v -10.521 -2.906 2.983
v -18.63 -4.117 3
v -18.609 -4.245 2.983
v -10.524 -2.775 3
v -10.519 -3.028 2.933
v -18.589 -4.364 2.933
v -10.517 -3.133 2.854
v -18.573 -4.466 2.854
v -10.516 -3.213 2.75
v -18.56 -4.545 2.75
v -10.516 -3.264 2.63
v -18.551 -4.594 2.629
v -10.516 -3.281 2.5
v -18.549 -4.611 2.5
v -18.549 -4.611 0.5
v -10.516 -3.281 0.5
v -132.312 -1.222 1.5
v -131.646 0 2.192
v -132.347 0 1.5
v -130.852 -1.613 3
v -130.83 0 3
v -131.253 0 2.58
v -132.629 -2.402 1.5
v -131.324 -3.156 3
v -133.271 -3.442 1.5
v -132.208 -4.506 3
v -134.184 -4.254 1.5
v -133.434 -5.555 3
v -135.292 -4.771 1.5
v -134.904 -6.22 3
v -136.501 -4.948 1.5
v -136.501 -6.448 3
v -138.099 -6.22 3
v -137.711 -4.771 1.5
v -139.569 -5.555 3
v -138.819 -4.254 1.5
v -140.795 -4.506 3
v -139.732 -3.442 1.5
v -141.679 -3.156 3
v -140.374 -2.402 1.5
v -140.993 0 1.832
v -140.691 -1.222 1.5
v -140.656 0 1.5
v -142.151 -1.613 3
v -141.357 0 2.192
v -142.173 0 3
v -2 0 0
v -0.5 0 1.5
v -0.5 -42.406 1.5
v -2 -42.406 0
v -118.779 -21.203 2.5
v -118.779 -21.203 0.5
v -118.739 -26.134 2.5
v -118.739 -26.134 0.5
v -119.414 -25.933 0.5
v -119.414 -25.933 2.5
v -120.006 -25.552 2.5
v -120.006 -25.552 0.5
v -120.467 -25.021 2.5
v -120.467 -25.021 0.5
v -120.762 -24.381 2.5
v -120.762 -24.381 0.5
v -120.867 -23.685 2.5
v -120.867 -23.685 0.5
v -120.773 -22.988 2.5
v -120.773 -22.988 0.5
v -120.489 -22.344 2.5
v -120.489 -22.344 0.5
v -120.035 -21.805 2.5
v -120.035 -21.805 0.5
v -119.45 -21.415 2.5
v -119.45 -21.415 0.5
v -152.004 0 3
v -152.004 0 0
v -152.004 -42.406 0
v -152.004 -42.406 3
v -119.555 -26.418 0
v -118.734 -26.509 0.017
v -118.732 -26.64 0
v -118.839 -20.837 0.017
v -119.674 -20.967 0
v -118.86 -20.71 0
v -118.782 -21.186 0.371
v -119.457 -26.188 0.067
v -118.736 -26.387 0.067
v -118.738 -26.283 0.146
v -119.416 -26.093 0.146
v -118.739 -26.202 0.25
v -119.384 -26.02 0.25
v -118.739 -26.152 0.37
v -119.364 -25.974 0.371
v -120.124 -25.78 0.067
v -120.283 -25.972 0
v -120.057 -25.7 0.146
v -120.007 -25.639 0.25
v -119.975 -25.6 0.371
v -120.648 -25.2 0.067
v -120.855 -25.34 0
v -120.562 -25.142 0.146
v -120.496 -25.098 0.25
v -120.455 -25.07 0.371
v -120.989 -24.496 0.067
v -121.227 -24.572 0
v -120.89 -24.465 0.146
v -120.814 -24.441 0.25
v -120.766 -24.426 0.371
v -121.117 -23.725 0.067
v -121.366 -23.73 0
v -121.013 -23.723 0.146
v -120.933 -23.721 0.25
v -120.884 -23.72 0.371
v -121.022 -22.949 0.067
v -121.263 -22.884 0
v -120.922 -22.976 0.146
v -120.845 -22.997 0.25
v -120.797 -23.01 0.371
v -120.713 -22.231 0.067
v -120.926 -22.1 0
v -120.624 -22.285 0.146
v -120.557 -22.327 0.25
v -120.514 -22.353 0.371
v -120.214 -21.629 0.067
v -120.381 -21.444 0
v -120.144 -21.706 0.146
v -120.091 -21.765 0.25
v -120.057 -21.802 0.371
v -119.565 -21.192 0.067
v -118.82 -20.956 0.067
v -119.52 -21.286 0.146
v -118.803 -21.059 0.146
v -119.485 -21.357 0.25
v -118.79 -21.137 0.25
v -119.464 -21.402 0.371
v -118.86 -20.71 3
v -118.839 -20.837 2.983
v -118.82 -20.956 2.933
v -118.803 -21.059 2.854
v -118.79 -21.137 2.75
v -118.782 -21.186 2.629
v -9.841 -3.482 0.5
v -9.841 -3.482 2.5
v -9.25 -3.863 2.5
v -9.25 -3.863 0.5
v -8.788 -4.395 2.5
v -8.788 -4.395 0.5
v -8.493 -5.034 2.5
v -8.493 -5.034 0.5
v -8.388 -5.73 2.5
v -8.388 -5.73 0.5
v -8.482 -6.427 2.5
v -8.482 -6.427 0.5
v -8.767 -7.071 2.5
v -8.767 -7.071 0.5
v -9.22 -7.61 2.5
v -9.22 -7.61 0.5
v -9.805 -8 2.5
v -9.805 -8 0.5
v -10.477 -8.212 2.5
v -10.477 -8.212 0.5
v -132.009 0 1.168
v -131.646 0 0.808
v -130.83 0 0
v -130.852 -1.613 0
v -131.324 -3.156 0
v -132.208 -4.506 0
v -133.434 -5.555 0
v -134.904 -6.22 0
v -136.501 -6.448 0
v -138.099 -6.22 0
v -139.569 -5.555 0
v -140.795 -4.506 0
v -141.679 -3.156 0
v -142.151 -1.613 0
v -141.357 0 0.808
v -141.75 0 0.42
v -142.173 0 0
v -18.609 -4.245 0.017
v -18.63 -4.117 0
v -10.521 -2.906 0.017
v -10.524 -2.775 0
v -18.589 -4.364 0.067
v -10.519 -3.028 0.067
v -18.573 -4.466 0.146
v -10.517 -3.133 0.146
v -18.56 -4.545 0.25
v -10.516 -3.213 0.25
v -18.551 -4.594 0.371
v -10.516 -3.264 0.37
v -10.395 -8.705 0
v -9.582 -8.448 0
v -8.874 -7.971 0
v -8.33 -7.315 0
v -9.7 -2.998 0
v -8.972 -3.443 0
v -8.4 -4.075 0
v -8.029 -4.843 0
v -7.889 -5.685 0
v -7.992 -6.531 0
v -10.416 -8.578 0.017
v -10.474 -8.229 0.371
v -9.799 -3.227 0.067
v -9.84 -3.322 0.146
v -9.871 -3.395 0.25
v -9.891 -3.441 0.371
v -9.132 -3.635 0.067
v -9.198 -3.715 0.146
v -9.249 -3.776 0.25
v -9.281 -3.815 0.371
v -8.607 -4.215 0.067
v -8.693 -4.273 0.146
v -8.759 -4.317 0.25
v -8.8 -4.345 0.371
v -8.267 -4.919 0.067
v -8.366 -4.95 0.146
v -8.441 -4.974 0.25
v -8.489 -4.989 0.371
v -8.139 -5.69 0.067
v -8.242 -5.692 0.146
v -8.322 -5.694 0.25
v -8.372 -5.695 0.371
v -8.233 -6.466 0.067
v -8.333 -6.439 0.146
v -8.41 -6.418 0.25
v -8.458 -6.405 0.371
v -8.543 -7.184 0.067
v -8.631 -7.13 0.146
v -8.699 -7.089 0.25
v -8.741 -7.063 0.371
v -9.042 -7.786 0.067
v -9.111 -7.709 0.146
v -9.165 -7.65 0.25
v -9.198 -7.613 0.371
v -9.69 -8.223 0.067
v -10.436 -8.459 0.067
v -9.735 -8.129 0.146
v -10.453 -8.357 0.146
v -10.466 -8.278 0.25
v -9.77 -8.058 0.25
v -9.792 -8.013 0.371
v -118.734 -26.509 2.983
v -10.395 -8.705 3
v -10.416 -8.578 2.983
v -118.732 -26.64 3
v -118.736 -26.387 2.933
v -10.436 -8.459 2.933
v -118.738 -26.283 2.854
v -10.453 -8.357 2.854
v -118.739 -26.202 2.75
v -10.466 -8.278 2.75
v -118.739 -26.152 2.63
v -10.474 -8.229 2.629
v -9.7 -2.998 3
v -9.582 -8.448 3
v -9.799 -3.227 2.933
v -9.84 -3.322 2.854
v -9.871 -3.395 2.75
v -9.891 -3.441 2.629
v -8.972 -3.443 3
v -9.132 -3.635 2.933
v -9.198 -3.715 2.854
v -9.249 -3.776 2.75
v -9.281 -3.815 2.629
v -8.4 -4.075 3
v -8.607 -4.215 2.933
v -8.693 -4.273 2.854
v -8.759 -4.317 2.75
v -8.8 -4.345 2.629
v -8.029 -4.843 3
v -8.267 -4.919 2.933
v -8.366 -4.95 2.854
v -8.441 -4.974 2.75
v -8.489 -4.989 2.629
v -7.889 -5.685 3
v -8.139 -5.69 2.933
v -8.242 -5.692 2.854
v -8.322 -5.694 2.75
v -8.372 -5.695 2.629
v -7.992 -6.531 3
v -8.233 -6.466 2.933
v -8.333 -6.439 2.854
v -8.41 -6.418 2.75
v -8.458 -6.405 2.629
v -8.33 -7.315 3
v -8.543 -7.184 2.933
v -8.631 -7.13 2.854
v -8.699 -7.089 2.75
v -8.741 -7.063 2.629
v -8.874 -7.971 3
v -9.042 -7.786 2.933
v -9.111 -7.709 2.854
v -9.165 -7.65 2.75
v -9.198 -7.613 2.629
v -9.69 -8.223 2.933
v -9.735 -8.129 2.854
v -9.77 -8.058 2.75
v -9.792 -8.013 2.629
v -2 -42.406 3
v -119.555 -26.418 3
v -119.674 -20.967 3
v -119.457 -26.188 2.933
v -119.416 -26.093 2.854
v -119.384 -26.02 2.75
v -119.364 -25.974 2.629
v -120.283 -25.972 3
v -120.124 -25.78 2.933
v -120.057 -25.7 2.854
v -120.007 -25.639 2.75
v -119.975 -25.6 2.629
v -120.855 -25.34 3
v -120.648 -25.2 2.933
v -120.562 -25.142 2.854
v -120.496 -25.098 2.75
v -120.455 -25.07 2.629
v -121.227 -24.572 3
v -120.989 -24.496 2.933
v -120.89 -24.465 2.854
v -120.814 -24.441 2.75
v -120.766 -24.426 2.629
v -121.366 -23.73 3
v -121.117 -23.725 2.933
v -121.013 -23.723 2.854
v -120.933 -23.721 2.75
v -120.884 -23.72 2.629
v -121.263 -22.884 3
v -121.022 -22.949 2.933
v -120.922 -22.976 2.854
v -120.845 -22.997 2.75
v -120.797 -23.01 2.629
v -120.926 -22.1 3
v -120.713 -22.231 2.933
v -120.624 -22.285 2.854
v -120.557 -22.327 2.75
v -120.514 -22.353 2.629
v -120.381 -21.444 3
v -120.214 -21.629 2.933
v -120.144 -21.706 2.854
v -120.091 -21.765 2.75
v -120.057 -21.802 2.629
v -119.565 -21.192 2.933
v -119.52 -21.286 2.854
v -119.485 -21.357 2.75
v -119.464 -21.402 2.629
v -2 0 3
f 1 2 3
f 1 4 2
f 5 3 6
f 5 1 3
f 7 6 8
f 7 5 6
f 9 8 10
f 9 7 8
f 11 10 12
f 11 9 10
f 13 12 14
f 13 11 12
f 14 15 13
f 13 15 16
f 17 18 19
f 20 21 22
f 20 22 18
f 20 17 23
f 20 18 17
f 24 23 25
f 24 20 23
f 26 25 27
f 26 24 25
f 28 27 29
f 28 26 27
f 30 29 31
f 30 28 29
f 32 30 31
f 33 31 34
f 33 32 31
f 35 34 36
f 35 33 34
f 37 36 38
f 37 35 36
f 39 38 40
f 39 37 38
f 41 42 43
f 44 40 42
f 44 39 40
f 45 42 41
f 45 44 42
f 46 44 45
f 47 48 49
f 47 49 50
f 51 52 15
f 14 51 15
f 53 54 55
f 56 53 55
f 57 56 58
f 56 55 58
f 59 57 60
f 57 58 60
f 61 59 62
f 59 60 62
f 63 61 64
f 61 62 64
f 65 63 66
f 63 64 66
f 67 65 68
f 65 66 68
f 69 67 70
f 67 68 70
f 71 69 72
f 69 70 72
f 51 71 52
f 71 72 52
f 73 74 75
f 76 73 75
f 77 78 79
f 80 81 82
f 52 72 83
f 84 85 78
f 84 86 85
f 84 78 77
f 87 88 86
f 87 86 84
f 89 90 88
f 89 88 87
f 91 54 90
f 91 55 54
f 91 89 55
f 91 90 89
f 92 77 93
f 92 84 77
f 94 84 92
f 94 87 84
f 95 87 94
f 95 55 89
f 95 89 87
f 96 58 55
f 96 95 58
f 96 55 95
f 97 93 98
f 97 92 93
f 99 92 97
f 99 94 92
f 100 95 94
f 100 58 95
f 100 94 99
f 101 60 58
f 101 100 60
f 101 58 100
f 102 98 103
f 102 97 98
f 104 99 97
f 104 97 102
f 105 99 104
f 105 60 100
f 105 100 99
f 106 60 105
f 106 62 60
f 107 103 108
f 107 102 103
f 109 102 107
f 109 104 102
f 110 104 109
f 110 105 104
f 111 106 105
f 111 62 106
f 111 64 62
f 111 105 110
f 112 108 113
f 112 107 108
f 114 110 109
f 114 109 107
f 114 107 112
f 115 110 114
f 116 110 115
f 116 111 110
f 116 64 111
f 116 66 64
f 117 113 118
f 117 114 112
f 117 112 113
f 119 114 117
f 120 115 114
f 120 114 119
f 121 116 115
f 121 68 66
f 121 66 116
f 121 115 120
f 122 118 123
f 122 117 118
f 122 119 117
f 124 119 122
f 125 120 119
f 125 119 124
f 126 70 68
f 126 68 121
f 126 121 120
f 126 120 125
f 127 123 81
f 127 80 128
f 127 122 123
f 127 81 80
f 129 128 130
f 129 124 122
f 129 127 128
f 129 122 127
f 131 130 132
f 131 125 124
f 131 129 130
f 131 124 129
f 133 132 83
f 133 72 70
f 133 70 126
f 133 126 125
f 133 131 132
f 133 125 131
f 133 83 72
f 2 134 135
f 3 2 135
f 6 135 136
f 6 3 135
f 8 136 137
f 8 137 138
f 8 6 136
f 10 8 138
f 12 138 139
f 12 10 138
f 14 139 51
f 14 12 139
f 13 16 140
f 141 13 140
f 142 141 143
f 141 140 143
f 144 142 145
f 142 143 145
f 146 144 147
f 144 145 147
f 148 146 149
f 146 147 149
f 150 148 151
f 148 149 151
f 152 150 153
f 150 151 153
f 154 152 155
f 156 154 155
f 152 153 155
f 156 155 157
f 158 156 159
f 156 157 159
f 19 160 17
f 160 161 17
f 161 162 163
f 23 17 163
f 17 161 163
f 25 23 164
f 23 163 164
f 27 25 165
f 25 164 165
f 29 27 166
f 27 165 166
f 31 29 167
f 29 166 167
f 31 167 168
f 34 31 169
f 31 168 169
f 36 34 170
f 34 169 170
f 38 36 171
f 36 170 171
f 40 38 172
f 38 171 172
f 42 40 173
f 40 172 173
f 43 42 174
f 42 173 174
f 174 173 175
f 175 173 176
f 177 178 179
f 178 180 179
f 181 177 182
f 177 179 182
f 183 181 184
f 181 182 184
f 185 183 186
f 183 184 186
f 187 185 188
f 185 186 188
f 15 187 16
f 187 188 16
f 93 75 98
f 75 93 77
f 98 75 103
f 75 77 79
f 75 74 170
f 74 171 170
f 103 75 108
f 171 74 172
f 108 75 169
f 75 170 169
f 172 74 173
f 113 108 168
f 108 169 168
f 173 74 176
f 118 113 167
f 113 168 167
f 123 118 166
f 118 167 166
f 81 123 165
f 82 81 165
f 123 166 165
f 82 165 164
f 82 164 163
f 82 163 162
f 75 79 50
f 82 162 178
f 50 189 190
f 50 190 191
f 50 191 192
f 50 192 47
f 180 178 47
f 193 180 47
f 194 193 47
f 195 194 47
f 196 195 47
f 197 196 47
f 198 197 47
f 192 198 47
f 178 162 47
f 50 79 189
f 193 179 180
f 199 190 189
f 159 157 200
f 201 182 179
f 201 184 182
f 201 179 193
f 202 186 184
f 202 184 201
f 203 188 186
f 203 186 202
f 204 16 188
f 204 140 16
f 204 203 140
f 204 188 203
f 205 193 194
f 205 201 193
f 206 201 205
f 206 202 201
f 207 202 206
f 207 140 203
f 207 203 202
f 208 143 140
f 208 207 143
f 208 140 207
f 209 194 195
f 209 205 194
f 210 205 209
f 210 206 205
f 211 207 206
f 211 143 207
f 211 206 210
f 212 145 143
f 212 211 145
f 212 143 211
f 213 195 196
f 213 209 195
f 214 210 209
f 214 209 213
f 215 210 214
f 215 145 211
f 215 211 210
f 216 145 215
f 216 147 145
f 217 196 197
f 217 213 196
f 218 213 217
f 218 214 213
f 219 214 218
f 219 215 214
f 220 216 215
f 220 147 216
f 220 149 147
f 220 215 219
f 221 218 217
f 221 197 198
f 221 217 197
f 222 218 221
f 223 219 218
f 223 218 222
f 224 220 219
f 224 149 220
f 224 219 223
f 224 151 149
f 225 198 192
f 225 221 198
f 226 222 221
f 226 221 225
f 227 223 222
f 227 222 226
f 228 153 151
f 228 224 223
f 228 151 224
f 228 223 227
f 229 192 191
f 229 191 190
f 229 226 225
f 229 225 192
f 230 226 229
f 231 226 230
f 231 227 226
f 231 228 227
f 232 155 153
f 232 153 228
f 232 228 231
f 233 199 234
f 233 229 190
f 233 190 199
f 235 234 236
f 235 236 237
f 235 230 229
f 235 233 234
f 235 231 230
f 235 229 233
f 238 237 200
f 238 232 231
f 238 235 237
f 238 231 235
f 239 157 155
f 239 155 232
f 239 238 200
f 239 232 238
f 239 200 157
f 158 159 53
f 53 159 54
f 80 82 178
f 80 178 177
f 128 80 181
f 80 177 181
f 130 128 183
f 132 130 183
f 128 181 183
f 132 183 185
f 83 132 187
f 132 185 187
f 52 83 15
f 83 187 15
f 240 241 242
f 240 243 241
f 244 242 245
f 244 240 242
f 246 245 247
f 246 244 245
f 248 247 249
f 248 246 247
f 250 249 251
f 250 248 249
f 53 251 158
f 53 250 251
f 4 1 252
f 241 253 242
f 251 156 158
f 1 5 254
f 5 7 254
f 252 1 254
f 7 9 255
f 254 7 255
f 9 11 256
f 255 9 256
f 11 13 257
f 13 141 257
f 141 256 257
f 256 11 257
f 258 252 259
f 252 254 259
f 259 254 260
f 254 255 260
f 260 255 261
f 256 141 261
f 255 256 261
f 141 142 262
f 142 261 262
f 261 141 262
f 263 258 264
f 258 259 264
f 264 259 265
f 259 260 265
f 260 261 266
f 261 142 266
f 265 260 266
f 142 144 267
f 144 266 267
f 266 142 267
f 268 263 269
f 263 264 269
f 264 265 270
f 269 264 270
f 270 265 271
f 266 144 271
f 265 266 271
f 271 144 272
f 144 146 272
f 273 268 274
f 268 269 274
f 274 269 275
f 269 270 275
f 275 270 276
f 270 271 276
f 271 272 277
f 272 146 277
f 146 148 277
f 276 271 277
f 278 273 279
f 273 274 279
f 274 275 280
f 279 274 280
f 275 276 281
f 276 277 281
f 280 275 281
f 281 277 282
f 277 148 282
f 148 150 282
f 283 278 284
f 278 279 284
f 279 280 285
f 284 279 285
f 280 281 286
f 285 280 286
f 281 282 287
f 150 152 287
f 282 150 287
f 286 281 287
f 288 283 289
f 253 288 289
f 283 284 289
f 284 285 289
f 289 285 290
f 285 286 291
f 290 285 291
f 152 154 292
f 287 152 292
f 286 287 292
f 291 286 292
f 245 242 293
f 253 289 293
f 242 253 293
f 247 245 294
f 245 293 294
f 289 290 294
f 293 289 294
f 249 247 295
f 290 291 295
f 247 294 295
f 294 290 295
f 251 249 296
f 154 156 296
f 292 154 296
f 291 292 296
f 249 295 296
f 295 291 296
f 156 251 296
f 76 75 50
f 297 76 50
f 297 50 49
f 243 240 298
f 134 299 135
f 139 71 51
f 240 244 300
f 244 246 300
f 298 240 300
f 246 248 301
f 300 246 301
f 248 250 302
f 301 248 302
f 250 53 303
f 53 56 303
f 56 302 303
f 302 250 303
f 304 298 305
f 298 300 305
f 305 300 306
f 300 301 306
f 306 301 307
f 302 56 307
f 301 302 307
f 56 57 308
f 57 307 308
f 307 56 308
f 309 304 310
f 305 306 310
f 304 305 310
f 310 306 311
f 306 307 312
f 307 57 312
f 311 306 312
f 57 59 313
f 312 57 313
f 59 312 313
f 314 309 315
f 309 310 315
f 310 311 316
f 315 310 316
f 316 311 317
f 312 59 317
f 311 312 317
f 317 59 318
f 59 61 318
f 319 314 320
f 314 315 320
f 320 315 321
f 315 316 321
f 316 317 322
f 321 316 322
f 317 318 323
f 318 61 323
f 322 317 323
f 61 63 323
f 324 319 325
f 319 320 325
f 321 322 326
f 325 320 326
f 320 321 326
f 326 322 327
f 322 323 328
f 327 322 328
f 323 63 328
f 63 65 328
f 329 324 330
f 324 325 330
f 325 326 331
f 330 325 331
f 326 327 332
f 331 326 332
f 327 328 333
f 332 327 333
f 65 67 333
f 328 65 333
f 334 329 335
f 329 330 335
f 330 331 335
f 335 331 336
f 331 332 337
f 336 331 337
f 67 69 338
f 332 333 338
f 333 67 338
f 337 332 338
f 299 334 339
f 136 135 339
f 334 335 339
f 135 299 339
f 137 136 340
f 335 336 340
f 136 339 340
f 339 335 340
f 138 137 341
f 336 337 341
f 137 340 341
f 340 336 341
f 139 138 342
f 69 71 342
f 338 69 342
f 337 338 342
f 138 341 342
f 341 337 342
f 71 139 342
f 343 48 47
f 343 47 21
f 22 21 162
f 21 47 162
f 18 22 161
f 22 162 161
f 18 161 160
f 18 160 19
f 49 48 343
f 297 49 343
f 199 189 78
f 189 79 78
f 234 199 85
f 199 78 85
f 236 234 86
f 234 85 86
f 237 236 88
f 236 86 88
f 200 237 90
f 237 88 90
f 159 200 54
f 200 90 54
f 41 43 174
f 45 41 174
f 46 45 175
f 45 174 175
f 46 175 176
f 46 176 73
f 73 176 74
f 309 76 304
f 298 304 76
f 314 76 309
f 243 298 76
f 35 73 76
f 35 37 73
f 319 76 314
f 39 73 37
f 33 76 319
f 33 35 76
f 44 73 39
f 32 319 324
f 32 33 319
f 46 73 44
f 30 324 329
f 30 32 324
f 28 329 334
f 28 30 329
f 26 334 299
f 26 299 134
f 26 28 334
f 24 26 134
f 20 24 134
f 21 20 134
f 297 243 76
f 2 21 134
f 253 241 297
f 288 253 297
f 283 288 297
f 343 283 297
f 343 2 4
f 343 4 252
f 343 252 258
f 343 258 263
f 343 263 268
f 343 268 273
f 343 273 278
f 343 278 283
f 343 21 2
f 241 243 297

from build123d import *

# Parameters (mm, degrees)
F1_DEPTH    = 3
F2_T1_DEPTH = 52.6928029293
F2_T4_ANGLE = 359.64
F2_T6_ANGLE = 359.64
F3_R        = 0.5


# Not quite as in the source:
# - a fillet or chamfer that OpenCascade refuses, or shapes differently, is made with other operations: its cross-section is extruded or revolved along the edge and cut away or added


with BuildPart() as f1:
    # F0 (on Top) → F1 (new body)
    with BuildSketch(Plane.XY):
        with BuildLine():
            Line((0, -21.2030354887), (0, 0))
            Line((0, 0), (-18.5486488044, 0))
            Line((-18.5486488044, 0), (-18.5486488044, -4.6107494656))
            Line((-18.5486488044, -4.6107494656), (-10.5158546939, -3.2809847035))
            ThreePointArc((-10.5158546939, -3.2809847035), (-8.3883004552, -5.7297930738), (-10.4765901342, -8.212170098))
            Line((-10.4765901342, -8.212170098), (-18.5486488044, -9.5484347937))
            Line((-18.5486488044, -9.5484347937), (-18.5486488044, -21.2030354887))
            Line((-18.5486488044, -21.2030354887), (0, -21.2030354887))
        make_face()
        with BuildLine():
            Line((-18.5486488044, -4.6107494656), (-18.5486488044, 0))
            Line((-18.5486488044, 0), (-132.8552216291, 0))
            ThreePointArc((-132.8552216291, 0), (-136.5013867617, -4.4477159734), (-140.1475518942, 0))
            Line((-140.1475518942, 0), (-152.0042717457, 0))
            Line((-152.0042717457, 0), (-152.0042717457, -42.4060709774))
            Line((-152.0042717457, -42.4060709774), (0, -42.4060709774))
            Line((0, -42.4060709774), (0, -21.2030354887))
            Line((0, -21.2030354887), (-18.5486488044, -21.2030354887))
            Line((-18.5486488044, -21.2030354887), (-18.5486488044, -9.5484347937))
            Line((-18.5486488044, -9.5484347937), (-118.7394559383, -26.1342208833))
            ThreePointArc((-118.7394559383, -26.1342208833), (-120.8670101771, -23.6854125129), (-118.7787204981, -21.2030354887))
            Line((-118.7787204981, -21.2030354887), (-18.5486488044, -4.6107494656))
        make_face()
    extrude(amount=F1_DEPTH)

    # F2: chamfer of 2 on 4 edges, made by hand

    # F2_s2 → F2_t1 (cut)
    with BuildSketch(Plane.XZ.offset(-5.1433659759)):
        Polygon((0, 1), (-2, 3), (0, 3), align=None)
        Polygon((0, 2), (-2, 0), (0, 0), align=None)
    extrude(amount=F2_T1_DEPTH, mode=Mode.SUBTRACT)

    # F2_s3 → F2_t4 (revolve, cut)
    with BuildSketch(Plane(origin=(-136.4977483257, 0.4288217341, 0), x_dir=(0, 0, 1), z_dir=(-0.9999950652, 0.0031415875, 0))):
        Polygon((1, 2.5602393555), (3, 4.5602393555), (3, 2.5602393555), align=None)
    revolve(axis=Axis((-136.5013867617, -0.7293245843, 3), (0, 0, -1)), revolution_arc=F2_T4_ANGLE, mode=Mode.SUBTRACT)

    # F2_s5 → F2_t6 (revolve, cut)
    with BuildSketch(Plane(origin=(-136.4977483257, 0.4288217341, 0), x_dir=(0, 0, 1), z_dir=(-0.9999950652, 0.0031415875, 0))):
        Polygon((2, 2.5602393555), (0, 4.5602393555), (0, 2.5602393555), align=None)
    revolve(axis=Axis((-136.5013867617, -0.7293245843, 0), (0, 0, -1)), revolution_arc=F2_T6_ANGLE, mode=Mode.SUBTRACT)

    # F3
    f3_edges = [f1.edges().sort_by_distance(p)[0] for p in [
        (-64.647288, -12.24201, 3),
        (-64.608023, -17.173195, 3),
        (-120.86701, -23.685413, 3),
        (-8.3883, -5.729793, 3),
        (-64.647288, -12.24201, 0),
        (-8.3883, -5.729793, 0),
        (-120.86701, -23.685413, 0),
    ]]
    fillet(f3_edges, radius=F3_R)


solid = f1.part
